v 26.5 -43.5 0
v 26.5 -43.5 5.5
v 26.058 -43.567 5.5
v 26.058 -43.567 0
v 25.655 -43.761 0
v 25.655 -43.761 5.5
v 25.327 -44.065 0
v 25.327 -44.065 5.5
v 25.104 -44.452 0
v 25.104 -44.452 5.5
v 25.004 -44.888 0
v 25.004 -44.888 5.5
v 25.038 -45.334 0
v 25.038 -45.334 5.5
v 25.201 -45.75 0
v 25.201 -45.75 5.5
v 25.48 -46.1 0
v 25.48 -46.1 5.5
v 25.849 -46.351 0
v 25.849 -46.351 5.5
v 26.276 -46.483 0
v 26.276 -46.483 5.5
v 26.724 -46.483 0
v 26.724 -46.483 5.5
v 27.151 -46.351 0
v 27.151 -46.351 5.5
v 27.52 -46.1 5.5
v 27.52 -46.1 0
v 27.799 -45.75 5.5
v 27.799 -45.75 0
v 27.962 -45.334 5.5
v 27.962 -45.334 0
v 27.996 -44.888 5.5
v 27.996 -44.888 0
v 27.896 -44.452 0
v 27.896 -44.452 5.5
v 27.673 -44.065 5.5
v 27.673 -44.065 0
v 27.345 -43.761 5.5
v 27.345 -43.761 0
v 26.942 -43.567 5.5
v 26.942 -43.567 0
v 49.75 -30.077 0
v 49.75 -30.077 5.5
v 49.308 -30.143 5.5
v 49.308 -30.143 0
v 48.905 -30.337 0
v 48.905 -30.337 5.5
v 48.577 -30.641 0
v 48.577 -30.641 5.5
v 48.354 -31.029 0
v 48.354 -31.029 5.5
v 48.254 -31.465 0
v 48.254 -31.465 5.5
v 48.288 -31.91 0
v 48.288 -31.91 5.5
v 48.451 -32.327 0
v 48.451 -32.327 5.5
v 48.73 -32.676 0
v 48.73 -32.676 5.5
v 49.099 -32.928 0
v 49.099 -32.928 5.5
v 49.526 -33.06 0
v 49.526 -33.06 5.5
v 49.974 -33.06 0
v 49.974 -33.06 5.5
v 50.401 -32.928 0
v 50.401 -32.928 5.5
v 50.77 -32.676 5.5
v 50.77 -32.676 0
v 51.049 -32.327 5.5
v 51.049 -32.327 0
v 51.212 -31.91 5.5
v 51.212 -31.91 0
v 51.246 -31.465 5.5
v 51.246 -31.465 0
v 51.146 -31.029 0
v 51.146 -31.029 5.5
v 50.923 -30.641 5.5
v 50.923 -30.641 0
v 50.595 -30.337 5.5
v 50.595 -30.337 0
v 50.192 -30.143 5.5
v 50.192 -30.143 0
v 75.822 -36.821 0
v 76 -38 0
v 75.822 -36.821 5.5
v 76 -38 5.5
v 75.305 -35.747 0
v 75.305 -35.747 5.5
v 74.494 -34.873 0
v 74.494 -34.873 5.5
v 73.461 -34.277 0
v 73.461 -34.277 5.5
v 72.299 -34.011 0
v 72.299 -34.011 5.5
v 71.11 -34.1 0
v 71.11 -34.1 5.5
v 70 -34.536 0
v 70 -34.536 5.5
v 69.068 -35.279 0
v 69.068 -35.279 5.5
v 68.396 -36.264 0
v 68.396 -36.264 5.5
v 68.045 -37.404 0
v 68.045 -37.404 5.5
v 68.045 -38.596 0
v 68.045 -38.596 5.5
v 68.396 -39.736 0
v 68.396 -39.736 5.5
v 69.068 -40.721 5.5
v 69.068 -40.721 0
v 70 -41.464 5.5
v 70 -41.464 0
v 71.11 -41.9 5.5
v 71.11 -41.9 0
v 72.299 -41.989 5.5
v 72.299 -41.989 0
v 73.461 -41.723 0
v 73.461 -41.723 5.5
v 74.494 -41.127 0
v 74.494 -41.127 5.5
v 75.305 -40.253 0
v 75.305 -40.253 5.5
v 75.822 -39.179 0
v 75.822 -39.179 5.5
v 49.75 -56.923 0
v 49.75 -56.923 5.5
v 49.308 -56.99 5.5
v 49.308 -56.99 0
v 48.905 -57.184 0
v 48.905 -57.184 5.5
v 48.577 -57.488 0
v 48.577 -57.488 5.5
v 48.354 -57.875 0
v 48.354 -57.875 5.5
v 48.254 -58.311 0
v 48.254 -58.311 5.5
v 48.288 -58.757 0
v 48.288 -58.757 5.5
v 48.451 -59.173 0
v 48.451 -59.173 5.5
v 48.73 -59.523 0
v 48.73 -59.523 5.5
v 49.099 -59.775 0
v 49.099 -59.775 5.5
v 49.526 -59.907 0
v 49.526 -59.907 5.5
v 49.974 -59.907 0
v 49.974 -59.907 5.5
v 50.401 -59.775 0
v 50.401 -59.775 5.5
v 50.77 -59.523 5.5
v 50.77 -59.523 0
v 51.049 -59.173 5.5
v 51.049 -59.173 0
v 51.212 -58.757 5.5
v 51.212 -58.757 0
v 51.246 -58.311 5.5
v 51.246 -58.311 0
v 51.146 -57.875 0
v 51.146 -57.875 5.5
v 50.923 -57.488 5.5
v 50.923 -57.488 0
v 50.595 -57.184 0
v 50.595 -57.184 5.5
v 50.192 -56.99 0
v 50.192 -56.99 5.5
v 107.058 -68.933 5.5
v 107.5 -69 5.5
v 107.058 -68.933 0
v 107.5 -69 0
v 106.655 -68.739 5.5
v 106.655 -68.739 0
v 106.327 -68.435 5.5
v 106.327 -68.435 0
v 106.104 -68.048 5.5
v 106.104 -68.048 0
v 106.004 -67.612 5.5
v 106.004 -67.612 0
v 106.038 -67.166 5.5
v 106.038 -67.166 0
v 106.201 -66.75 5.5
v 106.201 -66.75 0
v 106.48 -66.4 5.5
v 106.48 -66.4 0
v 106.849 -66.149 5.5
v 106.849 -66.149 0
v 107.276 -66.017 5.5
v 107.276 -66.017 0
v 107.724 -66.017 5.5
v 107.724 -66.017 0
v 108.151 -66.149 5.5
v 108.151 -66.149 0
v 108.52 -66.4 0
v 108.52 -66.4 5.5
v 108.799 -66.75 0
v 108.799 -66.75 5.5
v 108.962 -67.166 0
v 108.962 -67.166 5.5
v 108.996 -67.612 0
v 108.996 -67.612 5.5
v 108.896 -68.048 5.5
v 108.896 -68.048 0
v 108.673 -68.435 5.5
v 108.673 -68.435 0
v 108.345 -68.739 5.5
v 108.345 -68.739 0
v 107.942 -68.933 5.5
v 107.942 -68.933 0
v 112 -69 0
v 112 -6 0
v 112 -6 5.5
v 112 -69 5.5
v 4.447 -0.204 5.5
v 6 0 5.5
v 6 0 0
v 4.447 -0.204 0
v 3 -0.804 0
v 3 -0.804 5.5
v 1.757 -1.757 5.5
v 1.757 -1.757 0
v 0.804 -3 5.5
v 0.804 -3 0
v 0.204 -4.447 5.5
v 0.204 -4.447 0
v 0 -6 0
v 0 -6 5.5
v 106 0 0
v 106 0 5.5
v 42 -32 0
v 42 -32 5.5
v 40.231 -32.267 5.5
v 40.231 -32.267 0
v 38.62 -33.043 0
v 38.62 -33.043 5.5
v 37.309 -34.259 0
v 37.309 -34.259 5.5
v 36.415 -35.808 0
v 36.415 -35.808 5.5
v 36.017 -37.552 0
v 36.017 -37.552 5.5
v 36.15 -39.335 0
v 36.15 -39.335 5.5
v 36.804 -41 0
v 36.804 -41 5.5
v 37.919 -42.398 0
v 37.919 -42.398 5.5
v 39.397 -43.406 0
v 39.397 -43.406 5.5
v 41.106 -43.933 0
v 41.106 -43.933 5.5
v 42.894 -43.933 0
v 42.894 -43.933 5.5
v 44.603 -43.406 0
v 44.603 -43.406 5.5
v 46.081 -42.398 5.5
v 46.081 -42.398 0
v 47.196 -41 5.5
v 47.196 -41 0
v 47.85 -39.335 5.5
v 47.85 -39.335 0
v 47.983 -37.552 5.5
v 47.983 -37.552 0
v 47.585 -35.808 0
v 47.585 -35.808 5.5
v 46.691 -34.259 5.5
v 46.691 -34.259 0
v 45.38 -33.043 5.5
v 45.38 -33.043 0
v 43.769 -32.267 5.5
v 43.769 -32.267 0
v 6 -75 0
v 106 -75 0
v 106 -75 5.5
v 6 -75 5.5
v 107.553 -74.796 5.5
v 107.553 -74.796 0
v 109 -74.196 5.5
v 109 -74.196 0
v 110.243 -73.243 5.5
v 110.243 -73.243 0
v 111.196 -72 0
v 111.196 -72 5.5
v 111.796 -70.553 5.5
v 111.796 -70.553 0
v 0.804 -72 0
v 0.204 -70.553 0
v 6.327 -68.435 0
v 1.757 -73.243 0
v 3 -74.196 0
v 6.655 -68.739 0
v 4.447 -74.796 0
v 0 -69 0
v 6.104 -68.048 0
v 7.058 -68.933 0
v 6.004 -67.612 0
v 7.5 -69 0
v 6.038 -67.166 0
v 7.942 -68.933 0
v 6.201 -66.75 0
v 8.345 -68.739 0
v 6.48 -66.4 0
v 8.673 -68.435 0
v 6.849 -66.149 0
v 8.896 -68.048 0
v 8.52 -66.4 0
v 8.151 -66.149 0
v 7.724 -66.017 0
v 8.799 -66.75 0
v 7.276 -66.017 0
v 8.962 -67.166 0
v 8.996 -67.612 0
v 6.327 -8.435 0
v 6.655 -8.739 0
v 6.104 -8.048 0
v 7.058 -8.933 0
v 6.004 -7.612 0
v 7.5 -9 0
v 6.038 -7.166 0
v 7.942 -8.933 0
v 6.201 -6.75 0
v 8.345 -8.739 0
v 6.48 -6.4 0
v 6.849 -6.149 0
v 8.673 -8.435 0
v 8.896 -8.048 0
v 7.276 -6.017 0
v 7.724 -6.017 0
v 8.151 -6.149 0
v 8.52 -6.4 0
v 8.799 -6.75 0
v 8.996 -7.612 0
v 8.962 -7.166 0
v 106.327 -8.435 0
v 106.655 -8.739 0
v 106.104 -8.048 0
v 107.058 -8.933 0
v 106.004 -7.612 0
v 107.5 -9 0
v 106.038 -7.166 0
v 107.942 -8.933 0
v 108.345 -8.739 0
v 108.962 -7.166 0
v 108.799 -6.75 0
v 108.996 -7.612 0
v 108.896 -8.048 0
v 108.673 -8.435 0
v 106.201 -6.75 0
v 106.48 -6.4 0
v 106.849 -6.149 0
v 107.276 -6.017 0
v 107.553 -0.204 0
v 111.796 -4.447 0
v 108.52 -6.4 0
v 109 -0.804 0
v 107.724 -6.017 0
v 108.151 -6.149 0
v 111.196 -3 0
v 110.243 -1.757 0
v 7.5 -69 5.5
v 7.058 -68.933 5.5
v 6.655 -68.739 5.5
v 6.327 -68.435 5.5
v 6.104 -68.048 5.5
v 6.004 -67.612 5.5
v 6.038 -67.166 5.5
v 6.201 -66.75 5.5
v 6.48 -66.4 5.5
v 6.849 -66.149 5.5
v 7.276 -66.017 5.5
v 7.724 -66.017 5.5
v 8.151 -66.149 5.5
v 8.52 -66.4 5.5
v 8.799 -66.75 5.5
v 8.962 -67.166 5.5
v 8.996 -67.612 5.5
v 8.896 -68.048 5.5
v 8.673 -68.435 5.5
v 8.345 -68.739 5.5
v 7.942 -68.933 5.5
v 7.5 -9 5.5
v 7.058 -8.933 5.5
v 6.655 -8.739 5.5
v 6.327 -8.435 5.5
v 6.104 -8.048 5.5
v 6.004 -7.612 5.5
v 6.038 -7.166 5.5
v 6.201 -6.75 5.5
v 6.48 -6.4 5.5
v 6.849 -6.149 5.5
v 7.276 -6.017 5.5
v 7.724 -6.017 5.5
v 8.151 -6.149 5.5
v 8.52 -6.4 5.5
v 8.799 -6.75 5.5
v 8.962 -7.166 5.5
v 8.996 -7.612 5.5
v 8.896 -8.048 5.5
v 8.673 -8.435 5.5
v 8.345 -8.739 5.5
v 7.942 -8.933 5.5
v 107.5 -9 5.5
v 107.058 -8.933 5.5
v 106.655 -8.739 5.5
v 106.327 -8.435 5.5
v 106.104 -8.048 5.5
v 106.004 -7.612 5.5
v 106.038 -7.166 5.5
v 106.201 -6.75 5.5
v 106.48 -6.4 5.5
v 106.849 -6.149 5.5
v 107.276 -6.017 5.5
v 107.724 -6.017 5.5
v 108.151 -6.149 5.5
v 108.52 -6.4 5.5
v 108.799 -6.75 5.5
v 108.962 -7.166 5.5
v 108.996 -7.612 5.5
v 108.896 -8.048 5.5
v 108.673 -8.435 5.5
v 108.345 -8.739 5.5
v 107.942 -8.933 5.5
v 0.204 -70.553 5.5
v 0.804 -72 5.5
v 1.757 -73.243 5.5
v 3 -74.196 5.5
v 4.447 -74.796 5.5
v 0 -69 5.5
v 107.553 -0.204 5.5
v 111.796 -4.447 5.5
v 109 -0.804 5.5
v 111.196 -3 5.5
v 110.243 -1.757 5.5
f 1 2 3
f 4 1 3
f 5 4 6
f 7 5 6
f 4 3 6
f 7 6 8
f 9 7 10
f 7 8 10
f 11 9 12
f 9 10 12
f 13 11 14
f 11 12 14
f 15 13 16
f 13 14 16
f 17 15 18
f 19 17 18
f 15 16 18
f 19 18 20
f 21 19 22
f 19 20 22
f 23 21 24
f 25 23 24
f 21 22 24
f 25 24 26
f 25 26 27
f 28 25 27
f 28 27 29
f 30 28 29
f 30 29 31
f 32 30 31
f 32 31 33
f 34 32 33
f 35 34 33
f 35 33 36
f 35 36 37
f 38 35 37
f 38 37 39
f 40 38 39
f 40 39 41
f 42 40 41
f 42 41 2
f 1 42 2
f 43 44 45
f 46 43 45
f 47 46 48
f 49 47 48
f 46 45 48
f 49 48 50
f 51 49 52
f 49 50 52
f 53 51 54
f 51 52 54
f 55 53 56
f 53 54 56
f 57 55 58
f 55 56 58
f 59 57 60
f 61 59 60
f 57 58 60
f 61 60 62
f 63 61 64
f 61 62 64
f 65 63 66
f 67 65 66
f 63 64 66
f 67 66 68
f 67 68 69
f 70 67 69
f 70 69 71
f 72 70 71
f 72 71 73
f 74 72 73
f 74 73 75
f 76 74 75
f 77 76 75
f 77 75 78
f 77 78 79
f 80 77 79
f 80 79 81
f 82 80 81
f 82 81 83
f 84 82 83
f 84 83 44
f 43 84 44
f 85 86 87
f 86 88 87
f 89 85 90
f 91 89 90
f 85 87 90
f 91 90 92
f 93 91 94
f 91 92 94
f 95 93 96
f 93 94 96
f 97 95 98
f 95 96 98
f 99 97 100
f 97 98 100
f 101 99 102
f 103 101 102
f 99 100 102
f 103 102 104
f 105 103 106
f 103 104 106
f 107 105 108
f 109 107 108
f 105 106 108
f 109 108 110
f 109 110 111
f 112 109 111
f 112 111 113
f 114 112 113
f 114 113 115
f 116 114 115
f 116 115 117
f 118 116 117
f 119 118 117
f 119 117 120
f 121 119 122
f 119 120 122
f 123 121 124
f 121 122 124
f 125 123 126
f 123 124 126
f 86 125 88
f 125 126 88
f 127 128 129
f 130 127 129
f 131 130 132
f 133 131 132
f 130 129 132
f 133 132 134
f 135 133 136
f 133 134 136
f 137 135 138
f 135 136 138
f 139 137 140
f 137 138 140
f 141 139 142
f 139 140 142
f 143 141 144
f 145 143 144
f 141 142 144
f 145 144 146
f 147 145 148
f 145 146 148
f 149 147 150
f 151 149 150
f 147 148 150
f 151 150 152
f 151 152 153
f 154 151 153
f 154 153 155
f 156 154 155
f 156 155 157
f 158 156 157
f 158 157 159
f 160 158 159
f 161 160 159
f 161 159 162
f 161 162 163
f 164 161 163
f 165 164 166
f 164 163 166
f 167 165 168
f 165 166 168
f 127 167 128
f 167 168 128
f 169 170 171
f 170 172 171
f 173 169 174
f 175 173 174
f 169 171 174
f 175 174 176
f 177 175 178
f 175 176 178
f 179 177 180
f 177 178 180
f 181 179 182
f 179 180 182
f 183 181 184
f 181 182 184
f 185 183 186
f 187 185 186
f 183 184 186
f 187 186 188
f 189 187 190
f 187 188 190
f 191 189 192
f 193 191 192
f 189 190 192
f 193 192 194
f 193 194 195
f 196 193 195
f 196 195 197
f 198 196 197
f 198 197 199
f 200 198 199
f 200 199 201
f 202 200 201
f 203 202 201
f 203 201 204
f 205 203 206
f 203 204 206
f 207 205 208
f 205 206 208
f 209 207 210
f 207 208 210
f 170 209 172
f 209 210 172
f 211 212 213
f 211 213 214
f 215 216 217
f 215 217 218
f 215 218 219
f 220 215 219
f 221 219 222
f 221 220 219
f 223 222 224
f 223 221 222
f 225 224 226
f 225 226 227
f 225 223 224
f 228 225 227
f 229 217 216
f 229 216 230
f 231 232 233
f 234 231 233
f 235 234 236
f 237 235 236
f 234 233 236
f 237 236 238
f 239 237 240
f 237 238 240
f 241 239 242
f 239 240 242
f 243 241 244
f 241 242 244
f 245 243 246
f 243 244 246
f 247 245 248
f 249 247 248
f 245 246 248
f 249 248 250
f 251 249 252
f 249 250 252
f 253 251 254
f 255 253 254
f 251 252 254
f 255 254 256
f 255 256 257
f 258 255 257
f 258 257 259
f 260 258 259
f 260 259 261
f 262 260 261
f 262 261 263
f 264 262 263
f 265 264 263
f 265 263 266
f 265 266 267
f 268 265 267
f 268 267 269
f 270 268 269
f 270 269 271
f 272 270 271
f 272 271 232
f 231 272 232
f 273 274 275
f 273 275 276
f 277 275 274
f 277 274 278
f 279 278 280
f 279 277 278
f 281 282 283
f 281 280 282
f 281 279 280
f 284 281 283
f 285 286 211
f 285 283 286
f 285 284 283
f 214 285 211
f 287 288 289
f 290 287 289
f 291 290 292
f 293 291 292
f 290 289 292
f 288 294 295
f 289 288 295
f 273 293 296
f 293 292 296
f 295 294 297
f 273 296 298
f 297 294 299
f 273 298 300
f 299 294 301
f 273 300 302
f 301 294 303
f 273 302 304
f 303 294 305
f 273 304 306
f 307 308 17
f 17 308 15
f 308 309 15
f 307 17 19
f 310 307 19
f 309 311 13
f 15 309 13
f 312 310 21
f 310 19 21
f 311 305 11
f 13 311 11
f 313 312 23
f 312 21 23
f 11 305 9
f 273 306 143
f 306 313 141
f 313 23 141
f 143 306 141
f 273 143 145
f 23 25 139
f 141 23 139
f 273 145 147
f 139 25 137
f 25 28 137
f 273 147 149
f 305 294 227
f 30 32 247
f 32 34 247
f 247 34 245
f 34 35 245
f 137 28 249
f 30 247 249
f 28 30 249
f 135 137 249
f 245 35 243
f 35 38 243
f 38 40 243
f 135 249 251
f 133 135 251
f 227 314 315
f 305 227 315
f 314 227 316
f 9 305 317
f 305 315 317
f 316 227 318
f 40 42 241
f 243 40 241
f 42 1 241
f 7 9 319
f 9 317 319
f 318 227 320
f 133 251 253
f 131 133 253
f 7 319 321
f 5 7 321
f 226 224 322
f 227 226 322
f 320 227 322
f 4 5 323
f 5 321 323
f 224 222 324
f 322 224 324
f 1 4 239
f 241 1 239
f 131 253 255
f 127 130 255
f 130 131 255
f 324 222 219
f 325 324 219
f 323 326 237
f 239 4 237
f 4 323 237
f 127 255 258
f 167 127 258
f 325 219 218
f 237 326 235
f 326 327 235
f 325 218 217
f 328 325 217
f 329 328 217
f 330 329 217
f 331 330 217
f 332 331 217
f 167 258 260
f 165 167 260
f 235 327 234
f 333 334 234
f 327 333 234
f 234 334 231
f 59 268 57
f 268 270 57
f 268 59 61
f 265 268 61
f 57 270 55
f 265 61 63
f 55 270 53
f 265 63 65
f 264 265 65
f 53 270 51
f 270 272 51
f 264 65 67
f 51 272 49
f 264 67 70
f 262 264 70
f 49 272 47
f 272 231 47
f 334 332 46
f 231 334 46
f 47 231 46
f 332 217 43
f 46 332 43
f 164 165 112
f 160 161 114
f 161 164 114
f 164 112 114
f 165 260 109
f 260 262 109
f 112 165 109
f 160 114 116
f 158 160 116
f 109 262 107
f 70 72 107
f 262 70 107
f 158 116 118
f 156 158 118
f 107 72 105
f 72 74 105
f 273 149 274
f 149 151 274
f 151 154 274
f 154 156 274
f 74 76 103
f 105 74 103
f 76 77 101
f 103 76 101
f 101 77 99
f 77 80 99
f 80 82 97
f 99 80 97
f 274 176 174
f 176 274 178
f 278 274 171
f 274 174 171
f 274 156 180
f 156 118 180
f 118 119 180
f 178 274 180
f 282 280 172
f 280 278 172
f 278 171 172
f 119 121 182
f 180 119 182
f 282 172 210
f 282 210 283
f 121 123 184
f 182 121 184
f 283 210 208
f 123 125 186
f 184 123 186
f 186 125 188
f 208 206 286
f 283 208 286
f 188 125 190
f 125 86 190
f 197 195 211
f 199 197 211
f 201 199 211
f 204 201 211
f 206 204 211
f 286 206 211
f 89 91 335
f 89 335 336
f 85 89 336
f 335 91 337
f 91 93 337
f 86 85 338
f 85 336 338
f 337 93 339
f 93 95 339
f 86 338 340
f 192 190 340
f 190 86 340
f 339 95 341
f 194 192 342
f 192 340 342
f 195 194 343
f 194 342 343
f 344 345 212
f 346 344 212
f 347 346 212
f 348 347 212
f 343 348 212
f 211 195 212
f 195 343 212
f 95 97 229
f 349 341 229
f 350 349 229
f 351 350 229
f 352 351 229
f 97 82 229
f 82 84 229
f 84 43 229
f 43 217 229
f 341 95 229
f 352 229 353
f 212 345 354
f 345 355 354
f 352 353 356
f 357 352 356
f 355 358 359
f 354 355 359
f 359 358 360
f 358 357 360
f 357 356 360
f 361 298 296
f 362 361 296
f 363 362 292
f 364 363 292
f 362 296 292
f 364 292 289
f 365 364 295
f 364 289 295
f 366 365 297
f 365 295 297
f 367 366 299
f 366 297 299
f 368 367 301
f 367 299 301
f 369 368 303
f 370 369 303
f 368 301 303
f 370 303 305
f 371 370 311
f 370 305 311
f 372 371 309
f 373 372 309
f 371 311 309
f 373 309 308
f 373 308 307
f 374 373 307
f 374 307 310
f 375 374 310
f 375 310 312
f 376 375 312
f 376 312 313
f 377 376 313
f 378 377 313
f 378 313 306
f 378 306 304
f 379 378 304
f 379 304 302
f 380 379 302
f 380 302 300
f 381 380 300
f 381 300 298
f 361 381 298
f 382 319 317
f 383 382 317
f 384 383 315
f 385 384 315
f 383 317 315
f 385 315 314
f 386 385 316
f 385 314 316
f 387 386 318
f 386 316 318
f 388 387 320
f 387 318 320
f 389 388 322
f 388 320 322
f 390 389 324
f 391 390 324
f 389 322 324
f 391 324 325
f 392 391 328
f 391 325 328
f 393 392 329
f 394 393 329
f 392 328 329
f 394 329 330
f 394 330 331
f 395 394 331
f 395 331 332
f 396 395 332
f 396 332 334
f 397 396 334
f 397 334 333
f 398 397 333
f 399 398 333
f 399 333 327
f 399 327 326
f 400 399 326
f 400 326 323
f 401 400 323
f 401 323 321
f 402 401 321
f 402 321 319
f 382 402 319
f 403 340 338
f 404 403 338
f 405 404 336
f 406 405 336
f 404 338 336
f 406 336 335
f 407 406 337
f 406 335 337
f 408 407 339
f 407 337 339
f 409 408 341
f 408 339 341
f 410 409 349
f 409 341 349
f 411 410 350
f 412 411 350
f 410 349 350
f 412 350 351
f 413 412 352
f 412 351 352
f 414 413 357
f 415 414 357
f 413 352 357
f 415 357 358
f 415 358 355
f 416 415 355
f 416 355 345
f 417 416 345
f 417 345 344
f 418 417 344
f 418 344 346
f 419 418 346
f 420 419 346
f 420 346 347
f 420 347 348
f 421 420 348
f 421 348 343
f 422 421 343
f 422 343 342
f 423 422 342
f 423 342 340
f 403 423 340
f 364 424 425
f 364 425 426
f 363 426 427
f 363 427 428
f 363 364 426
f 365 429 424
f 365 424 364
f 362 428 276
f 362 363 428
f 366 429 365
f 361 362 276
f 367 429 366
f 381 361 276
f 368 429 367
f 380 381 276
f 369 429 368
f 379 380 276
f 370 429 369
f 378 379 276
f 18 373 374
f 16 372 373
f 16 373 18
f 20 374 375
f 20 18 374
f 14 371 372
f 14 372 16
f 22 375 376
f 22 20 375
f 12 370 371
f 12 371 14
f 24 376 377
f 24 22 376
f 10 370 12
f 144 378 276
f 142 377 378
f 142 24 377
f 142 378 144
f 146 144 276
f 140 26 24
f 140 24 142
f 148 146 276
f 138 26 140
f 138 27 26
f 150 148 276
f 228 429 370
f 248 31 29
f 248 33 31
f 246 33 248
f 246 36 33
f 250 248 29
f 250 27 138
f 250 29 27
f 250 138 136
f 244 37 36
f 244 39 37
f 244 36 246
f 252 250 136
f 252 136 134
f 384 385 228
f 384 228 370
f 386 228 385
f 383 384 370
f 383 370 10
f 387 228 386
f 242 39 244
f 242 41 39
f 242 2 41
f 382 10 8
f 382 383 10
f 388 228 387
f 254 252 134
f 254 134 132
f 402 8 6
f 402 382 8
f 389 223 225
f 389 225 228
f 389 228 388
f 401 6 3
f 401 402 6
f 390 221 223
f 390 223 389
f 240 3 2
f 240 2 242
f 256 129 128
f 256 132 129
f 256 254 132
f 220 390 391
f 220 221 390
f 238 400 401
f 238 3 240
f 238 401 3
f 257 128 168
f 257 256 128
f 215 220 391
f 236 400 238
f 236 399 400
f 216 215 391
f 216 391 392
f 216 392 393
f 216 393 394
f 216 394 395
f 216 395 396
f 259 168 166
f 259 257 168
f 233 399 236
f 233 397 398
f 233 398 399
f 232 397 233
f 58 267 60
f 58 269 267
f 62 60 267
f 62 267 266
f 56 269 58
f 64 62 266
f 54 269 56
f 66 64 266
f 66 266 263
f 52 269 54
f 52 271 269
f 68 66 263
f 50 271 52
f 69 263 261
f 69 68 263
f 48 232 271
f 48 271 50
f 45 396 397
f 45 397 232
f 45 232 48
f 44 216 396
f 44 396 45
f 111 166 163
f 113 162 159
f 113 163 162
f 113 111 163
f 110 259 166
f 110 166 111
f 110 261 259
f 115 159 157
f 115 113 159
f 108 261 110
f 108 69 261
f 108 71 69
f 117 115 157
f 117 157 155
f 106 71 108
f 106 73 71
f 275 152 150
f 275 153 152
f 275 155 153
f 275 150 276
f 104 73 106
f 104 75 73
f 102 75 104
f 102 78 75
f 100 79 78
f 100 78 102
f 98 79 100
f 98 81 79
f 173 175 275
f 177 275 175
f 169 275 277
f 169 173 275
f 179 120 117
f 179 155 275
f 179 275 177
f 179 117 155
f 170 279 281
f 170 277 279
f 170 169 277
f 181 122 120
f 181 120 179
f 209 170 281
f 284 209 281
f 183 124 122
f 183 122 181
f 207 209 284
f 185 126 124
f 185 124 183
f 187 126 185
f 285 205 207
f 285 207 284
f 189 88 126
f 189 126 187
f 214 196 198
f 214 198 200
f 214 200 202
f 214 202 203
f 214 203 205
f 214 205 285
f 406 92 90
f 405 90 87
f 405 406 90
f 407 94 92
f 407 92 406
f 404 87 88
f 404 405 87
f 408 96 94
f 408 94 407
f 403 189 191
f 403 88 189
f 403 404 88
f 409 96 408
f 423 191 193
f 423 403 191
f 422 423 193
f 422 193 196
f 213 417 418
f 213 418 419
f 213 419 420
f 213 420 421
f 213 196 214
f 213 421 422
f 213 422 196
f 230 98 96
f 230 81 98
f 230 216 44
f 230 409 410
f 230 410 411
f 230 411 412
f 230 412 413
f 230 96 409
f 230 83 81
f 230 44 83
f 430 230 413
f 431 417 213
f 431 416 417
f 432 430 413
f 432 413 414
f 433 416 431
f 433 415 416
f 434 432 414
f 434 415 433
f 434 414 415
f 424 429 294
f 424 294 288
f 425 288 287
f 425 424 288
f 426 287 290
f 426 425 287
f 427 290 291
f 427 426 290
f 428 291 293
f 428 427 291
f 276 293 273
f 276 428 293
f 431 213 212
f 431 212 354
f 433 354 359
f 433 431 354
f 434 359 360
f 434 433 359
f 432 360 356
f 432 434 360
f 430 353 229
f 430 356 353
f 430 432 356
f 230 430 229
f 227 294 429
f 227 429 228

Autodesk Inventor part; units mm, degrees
ref_plane "YZ Plane" through (0, 0, 0) normal (1, 0, 0) x (0, 1, 0)
ref_plane "XZ Plane" through (0, 0, 0) normal (0, 1, 0) x (-1, 0, 0)
ref_plane "XY Plane" through (0, 0, 0) normal (0, 0, 1) x (1, 0, 0)
sketch "スケッチ1" plane through (0, 0, 0) normal (0, 0, 1) x (1, 0, 0)
  line L0 (0, 0) -> (112, 0)
  line L1 (112, 0) -> (112, -75)
  line L2 (112, -75) -> (0, -75)
  line L3 (0, -75) -> (0, 0)
  dimension "d0" = 112
  dimension "d1" = 75
extrude "押し出し1" add sketch "スケッチ1" along normal blind 5.5
sketch "スケッチ2" plane through (0, 0, 5.5) normal (0, 0, 1) x (1, 0, 0)
  line L0 (112, 0) -> (0, 0) projected
  line L1 (0, 0) -> (0, -75) projected
  line L2 (0, -75) -> (112, -75) projected
  point P0 (7.5, -7.5)
  point P1 (107.5, -7.5)
  point P2 (107.5, -67.5)
  point P3 (7.5, -67.5)
  dimension "d4" = 7.5
  dimension "d5" = 7.5
  dimension "d6" = 7.5
  dimension "d7" = 100
  dimension "d8" = 60
  dimension "d9" = 60
  dimension "d10" = 100
  dimension "d19" = 7.5
  dimension "d51" = 7.5
hole "穴1" at (7.5, -7.5, 5.5) at (107.5, -7.5, 5.5) at (107.5, -67.5, 5.5) at (7.5, -67.5, 5.5) direction (0, 0, -1) diameter 3 end through all
fillet "フィレット1" radius 6 4 edges at (112, 0, 2.75) (112, -75, 2.75) (0, 0, 2.75) (0, -75, 2.75)
sketch "スケッチ3" plane through (0, 0, 0) normal (0, 0, -1) x (-1, 0, 0)
  circle A0 centre (-42, -45) radius 15.5
  line L0 (-112, -69) -> (-112, -6) projected
  line L1 (0, -6) -> (0, -69) projected
  line L2 (-106, 0) -> (-6, 0) projected
  line L3 (-6, -75) -> (-106, -75) projected
  line L4 (-42, -45) -> (-26.5, -45)
  line L5 (-42, -45) -> (-49.75, -31.5766)
  line L6 (-42, -45) -> (-49.75, -58.4234)
  point P0 (0, 0)
  dimension "d20" = 31
  dimension "d21" = 70
  dimension "d22" = 112
  dimension "d23" = 75
  dimension "d24" = 30
  dimension "d25" = 120
  dimension "d26" = 120
hole "穴2" at (49.75, -58.4234, 0) at (49.75, -31.5766, 0) at (26.5, -45, 0) direction (0, 0, 1) diameter 3 end through all
sketch "スケッチ4" plane through (0, 0, 0) normal (0, 0, -1) x (-1, 0, 0)
  line L0 (-42, -45) -> (-42, -38)
  line L1 (-6, -75) -> (-106, -75) projected
  line L2 (-106, 0) -> (-6, 0) projected
  line L3 (-112, -69) -> (-112, -6) projected
  point P0 (0, 0)
  dimension "d34" = 7
  dimension "d35" = 30
  dimension "d36" = 75
  dimension "d37" = 70
hole "穴3" at (42, -38, 0) direction (0, 0, 1) diameter 12 end through all
sketch "スケッチ5" plane through (0, 0, 5.5) normal (0, 0, 1) x (1, 0, 0)
  circle A0 centre (72, -38) radius 4
  circle A1 centre (42, -38) radius 6 projected
  line L0 (106, 0) -> (6, 0) projected
  point P0 (0, 0)
  dimension "d45" = 8
  dimension "d46" = 30
  dimension "d47" = 38
  dimension "d48" = 38
extrude "押し出し2" cut sketch "スケッチ5" against normal through all contours A0
equation "\"d4\" = d5"
equation "\"d5\" = d19"
equation "\"d6\" = d4"
equation "\"d9\" = d8"
equation "\"d10\" = d7"
equation "\"d48\" = d47"
properties part number "前後直動12x12_4" material "木材 (カエデ材)"
